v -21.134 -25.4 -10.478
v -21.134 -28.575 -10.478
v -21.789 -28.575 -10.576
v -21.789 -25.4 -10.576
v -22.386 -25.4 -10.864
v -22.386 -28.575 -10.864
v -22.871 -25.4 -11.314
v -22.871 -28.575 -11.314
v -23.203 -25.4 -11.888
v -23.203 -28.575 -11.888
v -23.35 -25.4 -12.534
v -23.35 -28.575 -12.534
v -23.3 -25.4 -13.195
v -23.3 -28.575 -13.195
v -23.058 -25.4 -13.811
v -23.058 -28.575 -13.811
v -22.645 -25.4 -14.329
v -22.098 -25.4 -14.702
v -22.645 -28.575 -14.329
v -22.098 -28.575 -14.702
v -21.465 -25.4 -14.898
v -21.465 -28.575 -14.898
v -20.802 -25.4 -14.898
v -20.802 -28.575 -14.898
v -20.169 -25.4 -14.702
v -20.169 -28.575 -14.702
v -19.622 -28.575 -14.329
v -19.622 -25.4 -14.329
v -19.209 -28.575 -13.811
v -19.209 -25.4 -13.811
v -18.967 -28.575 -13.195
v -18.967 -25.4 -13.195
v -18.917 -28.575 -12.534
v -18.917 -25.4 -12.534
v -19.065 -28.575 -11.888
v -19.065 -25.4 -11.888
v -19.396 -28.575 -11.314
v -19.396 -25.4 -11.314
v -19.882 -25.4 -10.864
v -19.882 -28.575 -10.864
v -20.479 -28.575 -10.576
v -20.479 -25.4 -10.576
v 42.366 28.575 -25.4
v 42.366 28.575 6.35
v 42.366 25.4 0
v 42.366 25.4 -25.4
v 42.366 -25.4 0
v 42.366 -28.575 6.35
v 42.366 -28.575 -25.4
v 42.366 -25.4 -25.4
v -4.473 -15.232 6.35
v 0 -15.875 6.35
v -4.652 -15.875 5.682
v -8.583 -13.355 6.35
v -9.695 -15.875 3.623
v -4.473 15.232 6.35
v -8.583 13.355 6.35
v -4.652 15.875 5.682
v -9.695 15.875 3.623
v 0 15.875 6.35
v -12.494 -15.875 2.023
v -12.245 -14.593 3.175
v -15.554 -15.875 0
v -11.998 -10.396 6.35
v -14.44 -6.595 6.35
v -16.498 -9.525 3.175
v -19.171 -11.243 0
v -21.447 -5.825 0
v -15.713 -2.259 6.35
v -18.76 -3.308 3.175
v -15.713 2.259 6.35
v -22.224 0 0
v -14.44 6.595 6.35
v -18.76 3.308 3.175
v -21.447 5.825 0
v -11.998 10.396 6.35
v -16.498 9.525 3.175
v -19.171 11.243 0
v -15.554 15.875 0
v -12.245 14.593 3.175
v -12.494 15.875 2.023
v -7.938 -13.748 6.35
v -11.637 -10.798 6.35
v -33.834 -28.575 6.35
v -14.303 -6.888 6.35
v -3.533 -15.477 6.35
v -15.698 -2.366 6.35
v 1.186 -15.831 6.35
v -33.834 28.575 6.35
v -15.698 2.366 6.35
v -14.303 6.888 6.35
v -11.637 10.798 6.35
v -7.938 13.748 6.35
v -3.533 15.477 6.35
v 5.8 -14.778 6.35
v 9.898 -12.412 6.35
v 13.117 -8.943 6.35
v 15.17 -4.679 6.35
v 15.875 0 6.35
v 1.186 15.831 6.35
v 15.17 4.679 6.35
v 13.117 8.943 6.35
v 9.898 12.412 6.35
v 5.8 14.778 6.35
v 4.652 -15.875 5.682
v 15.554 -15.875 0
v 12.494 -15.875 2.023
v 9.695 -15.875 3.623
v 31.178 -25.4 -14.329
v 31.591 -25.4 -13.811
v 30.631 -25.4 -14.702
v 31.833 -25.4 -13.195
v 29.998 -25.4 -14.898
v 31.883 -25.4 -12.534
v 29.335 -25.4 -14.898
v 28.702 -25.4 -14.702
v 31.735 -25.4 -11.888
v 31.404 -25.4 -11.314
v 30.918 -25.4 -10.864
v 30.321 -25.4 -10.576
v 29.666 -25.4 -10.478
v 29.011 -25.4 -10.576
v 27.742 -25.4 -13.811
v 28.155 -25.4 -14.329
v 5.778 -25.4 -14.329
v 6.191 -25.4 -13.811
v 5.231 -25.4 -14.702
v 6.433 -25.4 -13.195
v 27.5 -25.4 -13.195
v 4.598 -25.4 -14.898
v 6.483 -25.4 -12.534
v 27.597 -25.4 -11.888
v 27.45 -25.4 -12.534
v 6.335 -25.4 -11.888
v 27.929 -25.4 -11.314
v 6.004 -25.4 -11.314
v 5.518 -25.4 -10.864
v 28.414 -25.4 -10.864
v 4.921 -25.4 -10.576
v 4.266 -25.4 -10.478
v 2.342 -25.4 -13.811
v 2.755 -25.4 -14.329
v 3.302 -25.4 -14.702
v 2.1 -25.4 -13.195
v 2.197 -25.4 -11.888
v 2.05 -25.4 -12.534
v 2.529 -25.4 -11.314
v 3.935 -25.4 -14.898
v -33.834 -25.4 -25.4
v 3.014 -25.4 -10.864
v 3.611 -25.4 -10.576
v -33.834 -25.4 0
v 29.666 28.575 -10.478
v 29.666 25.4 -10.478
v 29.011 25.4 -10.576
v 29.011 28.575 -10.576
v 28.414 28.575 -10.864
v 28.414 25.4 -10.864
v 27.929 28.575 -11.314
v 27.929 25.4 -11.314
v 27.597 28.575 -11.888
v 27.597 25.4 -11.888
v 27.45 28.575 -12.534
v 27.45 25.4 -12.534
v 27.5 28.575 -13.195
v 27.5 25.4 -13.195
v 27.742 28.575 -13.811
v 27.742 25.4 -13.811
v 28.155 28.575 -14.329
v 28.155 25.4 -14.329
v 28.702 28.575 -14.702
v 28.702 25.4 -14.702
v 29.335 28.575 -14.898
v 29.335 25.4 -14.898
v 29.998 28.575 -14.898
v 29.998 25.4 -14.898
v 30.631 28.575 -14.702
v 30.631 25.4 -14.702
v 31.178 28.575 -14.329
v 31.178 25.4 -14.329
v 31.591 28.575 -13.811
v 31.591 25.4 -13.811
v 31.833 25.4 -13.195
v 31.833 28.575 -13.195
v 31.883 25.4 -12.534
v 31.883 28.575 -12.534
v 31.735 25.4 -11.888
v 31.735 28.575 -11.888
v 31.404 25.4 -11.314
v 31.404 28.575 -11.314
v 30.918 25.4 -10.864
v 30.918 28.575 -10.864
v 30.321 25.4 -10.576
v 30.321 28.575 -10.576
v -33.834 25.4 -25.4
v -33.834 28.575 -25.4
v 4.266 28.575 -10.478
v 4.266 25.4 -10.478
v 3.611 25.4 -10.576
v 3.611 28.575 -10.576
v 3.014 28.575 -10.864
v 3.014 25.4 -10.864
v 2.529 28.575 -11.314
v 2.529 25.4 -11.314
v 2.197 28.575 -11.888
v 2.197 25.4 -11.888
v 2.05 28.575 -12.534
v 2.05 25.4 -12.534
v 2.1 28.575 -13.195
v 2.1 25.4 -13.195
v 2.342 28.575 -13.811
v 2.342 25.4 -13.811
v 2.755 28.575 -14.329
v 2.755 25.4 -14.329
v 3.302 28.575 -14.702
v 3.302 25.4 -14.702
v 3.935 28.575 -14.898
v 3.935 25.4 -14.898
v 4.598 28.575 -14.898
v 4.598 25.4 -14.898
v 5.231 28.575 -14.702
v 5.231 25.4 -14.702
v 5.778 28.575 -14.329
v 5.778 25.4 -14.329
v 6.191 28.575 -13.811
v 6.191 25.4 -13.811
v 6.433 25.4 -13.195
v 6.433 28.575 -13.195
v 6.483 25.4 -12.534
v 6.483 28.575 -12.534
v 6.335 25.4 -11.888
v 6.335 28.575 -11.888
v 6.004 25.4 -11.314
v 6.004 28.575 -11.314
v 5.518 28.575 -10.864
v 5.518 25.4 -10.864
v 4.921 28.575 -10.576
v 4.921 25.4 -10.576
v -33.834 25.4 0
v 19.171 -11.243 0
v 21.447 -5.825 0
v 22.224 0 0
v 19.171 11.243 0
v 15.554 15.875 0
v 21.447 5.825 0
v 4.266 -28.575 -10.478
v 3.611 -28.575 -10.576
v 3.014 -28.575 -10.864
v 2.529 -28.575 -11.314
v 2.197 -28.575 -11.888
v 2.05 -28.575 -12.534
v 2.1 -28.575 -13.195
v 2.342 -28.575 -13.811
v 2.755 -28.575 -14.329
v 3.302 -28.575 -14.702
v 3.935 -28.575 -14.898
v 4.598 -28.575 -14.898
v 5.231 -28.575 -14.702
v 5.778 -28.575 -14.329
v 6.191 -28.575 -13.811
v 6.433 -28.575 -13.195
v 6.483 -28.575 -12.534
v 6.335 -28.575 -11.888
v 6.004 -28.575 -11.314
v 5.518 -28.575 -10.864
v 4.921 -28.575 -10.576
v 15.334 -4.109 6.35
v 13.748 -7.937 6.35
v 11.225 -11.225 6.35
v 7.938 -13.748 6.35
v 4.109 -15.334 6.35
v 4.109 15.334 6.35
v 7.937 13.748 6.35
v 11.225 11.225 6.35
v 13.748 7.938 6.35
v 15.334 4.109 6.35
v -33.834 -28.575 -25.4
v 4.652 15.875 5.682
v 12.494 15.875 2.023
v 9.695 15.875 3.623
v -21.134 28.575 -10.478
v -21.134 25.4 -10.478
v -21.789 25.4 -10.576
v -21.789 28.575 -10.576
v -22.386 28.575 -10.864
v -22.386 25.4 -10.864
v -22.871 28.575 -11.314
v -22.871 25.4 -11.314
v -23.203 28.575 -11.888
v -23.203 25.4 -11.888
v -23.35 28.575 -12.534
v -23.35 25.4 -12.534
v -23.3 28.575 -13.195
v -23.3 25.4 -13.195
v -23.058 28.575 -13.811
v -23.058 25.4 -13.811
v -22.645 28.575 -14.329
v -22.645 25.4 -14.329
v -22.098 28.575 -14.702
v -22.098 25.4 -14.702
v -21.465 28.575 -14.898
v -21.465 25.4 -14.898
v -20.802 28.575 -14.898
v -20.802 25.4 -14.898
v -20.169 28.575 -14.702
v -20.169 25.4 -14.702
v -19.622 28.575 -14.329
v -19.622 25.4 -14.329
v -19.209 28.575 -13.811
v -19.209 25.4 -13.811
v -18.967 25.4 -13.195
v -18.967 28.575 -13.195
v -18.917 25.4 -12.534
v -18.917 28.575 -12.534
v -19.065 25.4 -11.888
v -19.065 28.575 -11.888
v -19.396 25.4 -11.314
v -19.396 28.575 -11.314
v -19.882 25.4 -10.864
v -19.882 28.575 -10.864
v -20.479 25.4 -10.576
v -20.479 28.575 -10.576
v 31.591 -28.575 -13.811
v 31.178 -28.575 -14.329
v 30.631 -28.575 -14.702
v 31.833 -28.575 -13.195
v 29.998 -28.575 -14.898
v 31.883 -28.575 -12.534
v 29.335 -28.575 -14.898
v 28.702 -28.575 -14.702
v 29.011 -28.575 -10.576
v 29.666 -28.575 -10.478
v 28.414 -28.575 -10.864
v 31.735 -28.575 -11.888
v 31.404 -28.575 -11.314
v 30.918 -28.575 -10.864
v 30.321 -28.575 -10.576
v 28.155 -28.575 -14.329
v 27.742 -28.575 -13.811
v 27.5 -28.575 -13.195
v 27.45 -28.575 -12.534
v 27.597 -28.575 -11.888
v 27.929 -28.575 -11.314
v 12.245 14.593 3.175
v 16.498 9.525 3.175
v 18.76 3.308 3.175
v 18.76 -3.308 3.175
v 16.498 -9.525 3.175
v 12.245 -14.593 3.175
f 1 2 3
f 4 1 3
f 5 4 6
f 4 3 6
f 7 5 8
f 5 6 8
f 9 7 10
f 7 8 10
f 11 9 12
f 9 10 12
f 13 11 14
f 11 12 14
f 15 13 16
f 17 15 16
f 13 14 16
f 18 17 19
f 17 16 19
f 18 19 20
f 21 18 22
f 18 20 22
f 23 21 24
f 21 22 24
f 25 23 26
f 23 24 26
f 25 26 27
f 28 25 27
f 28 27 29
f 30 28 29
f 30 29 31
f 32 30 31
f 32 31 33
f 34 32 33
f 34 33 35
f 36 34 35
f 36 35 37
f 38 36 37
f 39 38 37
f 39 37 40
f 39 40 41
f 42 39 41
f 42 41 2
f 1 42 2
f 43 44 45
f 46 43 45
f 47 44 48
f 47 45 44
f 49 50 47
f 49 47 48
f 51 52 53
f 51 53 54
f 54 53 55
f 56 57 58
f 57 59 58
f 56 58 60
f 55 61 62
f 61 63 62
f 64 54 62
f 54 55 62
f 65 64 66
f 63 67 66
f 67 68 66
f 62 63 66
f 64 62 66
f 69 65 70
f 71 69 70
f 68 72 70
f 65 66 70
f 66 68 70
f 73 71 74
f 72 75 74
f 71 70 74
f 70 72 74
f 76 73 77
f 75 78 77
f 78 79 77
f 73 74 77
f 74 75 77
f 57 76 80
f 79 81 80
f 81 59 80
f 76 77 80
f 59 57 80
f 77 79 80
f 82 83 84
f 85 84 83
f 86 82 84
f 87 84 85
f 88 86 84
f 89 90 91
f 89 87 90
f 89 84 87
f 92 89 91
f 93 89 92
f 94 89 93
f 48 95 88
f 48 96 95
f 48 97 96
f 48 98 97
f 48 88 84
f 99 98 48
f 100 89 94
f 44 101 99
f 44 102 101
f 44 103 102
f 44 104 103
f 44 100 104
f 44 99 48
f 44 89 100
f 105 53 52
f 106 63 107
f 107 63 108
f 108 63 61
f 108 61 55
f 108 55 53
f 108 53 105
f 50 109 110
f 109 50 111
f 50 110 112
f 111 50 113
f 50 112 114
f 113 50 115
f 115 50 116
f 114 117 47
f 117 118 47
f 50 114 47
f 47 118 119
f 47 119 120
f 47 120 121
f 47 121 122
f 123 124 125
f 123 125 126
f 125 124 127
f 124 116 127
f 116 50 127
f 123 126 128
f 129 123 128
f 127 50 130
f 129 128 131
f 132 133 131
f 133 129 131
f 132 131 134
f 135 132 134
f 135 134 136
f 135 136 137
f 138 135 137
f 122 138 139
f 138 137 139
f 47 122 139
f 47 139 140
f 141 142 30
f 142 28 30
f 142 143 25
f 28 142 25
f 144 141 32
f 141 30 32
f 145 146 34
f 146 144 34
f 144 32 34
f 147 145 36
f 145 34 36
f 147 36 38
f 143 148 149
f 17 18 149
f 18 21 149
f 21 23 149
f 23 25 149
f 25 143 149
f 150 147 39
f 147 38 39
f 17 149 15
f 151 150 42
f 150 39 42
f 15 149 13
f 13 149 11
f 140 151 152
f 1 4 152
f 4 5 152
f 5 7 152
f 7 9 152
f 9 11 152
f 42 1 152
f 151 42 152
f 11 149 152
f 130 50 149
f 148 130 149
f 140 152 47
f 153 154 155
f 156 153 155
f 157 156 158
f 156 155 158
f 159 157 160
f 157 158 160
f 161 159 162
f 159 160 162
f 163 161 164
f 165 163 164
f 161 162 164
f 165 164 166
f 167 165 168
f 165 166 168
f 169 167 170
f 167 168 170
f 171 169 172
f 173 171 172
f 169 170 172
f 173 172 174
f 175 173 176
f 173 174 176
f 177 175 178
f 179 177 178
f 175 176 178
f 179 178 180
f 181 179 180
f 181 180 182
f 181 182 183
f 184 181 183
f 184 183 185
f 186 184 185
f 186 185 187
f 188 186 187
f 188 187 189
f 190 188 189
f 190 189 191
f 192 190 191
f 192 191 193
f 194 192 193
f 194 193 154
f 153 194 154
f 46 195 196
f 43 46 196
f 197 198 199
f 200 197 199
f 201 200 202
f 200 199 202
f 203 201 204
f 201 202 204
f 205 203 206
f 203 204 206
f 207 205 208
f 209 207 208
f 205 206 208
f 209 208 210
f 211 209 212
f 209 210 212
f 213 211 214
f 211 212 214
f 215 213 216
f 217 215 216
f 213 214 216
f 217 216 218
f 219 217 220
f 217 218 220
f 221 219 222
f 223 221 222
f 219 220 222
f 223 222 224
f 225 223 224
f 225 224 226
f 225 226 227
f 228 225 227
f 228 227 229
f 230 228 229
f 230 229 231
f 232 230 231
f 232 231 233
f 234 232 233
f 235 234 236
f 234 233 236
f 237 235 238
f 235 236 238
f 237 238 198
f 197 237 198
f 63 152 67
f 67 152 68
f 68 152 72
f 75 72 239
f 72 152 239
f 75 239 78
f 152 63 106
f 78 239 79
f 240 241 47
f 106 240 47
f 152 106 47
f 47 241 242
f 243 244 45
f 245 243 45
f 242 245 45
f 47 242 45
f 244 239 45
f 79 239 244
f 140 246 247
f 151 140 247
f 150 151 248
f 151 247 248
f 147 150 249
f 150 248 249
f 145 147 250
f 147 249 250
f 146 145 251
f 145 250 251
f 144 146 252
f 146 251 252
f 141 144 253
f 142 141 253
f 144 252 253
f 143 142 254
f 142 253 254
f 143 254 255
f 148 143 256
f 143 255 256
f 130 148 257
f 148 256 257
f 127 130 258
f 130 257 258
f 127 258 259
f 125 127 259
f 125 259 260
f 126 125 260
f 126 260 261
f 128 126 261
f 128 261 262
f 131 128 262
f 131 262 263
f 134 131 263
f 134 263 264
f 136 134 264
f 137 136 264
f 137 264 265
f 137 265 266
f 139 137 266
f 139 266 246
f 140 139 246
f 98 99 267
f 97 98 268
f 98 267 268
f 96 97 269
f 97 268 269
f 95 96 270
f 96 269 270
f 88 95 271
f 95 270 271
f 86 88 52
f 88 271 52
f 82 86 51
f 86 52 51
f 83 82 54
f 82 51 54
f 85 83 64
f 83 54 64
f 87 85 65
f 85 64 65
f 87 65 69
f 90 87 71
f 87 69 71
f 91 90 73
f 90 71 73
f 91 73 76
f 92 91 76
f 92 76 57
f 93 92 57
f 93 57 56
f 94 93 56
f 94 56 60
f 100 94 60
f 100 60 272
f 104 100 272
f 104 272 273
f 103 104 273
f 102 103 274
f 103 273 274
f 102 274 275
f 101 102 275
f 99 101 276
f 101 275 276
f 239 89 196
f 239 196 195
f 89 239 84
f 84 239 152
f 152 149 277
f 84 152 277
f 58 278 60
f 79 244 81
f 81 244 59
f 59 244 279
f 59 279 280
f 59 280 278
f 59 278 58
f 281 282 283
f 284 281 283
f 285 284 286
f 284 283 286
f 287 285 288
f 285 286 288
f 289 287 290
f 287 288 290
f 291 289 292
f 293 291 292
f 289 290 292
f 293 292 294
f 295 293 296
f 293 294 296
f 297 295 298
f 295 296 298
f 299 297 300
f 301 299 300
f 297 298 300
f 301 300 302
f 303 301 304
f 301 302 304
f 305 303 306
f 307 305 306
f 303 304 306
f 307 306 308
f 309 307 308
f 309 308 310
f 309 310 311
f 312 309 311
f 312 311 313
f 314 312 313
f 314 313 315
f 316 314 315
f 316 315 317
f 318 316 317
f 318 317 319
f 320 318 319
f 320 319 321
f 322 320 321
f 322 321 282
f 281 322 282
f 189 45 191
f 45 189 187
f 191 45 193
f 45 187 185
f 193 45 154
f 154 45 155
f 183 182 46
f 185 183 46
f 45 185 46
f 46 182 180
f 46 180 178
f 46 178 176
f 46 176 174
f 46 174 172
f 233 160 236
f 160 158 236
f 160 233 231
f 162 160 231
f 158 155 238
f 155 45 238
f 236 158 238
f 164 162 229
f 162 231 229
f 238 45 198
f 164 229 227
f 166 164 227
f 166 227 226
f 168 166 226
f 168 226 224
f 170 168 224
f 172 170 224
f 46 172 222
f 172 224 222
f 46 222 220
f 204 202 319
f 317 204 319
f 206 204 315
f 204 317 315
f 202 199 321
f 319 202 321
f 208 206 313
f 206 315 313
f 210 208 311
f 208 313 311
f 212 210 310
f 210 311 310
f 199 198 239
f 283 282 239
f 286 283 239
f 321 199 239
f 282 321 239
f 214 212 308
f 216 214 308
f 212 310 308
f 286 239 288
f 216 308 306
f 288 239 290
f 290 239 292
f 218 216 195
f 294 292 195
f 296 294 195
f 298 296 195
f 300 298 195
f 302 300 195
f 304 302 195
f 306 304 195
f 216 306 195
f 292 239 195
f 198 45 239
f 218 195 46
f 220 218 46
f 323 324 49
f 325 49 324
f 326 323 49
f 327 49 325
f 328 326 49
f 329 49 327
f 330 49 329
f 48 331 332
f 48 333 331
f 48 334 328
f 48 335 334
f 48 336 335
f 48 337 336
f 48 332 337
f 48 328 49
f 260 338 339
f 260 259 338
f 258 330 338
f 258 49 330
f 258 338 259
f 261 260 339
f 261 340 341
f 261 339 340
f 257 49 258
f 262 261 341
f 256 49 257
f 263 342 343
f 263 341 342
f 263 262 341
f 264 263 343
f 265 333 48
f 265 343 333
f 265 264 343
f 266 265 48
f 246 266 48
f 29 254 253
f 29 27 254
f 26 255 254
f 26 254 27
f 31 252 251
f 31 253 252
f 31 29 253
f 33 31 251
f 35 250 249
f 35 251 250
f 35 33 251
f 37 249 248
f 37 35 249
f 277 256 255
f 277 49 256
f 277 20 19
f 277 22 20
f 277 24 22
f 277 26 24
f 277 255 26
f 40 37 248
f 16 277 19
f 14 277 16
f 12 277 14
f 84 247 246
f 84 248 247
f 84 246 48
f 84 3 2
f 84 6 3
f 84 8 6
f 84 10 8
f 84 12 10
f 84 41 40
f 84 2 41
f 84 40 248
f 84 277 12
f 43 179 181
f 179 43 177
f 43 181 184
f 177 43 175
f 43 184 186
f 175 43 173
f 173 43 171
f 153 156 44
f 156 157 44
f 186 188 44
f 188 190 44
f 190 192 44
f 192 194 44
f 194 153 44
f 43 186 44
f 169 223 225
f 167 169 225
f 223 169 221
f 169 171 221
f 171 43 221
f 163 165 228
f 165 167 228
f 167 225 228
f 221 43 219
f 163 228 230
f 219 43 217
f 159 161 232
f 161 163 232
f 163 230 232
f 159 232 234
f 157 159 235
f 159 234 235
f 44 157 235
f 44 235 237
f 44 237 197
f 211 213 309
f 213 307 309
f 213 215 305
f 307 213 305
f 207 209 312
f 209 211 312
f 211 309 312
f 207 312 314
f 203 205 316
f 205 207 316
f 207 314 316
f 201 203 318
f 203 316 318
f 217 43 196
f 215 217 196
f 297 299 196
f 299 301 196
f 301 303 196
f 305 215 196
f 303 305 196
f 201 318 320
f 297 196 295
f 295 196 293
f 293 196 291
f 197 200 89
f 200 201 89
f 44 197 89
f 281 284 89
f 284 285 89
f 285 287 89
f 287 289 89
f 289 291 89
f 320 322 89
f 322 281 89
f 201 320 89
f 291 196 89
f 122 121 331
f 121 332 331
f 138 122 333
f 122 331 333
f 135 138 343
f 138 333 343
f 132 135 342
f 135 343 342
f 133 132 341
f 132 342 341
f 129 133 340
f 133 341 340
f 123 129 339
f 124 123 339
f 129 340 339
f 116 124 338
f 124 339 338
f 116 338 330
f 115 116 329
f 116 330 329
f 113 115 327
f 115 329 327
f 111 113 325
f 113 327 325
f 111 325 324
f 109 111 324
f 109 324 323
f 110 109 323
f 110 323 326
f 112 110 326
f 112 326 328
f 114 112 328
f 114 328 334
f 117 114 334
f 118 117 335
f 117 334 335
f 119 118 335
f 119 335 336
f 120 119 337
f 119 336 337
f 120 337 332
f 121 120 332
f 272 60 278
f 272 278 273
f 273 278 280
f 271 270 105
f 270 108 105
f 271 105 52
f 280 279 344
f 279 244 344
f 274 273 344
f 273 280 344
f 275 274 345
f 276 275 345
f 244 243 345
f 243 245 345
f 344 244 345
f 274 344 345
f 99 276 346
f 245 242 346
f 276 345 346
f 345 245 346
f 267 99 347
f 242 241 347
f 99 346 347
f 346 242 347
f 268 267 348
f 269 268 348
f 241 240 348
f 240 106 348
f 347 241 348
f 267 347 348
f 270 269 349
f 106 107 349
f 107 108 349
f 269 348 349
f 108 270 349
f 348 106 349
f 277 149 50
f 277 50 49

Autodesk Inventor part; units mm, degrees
ref_plane "YZ Plane" through (0, 0, 0) normal (1, 0, 0) x (0, 1, 0)
ref_plane "XZ Plane" through (0, 0, 0) normal (0, 1, 0) x (-1, 0, 0)
ref_plane "XY Plane" through (0, 0, 0) normal (0, 0, 1) x (1, 0, 0)
sketch "Sketch1" plane through (0, 0, 0) normal (0, 0, 1) x (1, 0, 0)
  circle A0 centre (0, 0) radius 15.875
  line L0 (0, 15.875) -> (0, 25.4)
  line L1 (0, 25.4) -> (-33.8337, 25.4)
  line L2 (-33.8337, 25.4) -> (-33.8337, -25.4)
  line L3 (-33.8337, -25.4) -> (0, -25.4)
  line L4 (0, -25.4) -> (0, -15.875)
  line L5 (0, -15.875) -> (0, 15.875)
  line L6 (0, 25.4) -> (42.3663, 25.4)
  line L7 (42.3663, 25.4) -> (42.3663, -25.4)
  line L8 (42.3663, -25.4) -> (0, -25.4)
  line L9 (0, -25.4) -> (0, 25.4)
  line L10 (4.2663, 25.4) -> (4.2663, -25.4) construction
  line L11 (-21.1337, 25.4) -> (-21.1337, -25.4) construction
  line L12 (29.6663, 25.4) -> (29.6663, -25.4) construction
  dimension "d0" = 31.75
  dimension "d1" = 50.8
  dimension "d3" = 4.2663
  dimension "d6" = 38.1
  dimension "d7" = 38.1
  dimension "d8" = 25.4
  dimension "d9" = 25.4
extrude "Extrusion1" add sketch "Sketch1" along normal blind 6.35 contours A0 L0 L6 L7 L8 L4 | A0 L4 L3 L2 L1 L0
chamfer "Chamfer1" distance 6.35 distance2 6.35 1 edges at (-15.875, 0, 0) measured on face at (15.8235, -1.2774, 4.2333)
sketch "Sketch2" plane through (-33.8337, -25.4, 0) normal (-1, 0, 0) x (0, 0, 1)
  line L0 (0, 0) -> (6.35, 0) projected
  line L1 (6.35, 0) -> (-25.4, 0)
  line L2 (-25.4, 0) -> (-25.4, -3.175)
  line L3 (-25.4, -3.175) -> (6.35, -3.175)
  line L4 (6.35, -3.175) -> (6.35, 0)
  line L5 (6.35, 50.8) -> (-25.4, 50.8)
  line L6 (-25.4, 50.8) -> (-25.4, 53.975)
  line L7 (-25.4, 53.975) -> (6.35, 53.975)
  line L8 (6.35, 53.975) -> (6.35, 50.8)
  line L9 (0, 50.8) -> (0, 0) projected
  point P0 (0, 25.4)
  dimension "d15" = 3.175
  dimension "d16" = 25.4
extrude "Extrusion2" add sketch "Sketch2" against normal up to surface (76.2 mm away)
sketch "Sketch3" plane through (-33.8337, 28.575, 6.35) normal (0, 1, 0) x (1, 0, 0)
  line L0 (0, 0) -> (0, 31.75) projected
  line L1 (0, 31.75) -> (76.2, 31.75) projected
  point P0 (33.8337, 6.35)
  point P1 (12.7, 19.05)
  point P2 (38.1, 19.05)
  point P3 (63.5, 19.05)
  dimension "d19" = 12.7
  dimension "d20" = 25.4
  dimension "d21" = 25.4
  dimension "d22" = 12.7
hole "Hole1" at (-21.1337, 28.575, -12.7) at (4.2663, 28.575, -12.7) at (29.6663, 28.575, -12.7) direction (0, -1, 0) diameter 4.445 end through all
sketch "Sketch4" plane through (0, 0, 0) normal (0, 0, -1) x (-1, 0, 0)
  line L0 (22.225, -15.875) -> (-22.225, -15.875)
  line L1 (-22.225, -15.875) -> (-22.225, 15.875)
  line L2 (-22.225, 15.875) -> (22.225, 15.875)
  line L3 (22.225, 15.875) -> (22.225, -15.875)
  line L4 (22.225, -15.875) -> (-22.225, 15.875) construction
  line L5 (-22.225, -15.875) -> (22.225, 15.875) construction
  circle A0 centre (0, 0) radius 15.875 projected
  circle A1 centre (0, 0) radius 22.225 projected
  point P0 (15.5543, 15.875)
  point P1 (-15.5543, 15.875)
  point P2 (-15.5543, -15.875)
  point P3 (15.5543, -15.875)
extrude "Extrusion3" add sketch "Sketch4" against normal up to surface (6.35 mm away) contours A1 L0 | L2 A1
properties part number "Outer Channel Guide"
